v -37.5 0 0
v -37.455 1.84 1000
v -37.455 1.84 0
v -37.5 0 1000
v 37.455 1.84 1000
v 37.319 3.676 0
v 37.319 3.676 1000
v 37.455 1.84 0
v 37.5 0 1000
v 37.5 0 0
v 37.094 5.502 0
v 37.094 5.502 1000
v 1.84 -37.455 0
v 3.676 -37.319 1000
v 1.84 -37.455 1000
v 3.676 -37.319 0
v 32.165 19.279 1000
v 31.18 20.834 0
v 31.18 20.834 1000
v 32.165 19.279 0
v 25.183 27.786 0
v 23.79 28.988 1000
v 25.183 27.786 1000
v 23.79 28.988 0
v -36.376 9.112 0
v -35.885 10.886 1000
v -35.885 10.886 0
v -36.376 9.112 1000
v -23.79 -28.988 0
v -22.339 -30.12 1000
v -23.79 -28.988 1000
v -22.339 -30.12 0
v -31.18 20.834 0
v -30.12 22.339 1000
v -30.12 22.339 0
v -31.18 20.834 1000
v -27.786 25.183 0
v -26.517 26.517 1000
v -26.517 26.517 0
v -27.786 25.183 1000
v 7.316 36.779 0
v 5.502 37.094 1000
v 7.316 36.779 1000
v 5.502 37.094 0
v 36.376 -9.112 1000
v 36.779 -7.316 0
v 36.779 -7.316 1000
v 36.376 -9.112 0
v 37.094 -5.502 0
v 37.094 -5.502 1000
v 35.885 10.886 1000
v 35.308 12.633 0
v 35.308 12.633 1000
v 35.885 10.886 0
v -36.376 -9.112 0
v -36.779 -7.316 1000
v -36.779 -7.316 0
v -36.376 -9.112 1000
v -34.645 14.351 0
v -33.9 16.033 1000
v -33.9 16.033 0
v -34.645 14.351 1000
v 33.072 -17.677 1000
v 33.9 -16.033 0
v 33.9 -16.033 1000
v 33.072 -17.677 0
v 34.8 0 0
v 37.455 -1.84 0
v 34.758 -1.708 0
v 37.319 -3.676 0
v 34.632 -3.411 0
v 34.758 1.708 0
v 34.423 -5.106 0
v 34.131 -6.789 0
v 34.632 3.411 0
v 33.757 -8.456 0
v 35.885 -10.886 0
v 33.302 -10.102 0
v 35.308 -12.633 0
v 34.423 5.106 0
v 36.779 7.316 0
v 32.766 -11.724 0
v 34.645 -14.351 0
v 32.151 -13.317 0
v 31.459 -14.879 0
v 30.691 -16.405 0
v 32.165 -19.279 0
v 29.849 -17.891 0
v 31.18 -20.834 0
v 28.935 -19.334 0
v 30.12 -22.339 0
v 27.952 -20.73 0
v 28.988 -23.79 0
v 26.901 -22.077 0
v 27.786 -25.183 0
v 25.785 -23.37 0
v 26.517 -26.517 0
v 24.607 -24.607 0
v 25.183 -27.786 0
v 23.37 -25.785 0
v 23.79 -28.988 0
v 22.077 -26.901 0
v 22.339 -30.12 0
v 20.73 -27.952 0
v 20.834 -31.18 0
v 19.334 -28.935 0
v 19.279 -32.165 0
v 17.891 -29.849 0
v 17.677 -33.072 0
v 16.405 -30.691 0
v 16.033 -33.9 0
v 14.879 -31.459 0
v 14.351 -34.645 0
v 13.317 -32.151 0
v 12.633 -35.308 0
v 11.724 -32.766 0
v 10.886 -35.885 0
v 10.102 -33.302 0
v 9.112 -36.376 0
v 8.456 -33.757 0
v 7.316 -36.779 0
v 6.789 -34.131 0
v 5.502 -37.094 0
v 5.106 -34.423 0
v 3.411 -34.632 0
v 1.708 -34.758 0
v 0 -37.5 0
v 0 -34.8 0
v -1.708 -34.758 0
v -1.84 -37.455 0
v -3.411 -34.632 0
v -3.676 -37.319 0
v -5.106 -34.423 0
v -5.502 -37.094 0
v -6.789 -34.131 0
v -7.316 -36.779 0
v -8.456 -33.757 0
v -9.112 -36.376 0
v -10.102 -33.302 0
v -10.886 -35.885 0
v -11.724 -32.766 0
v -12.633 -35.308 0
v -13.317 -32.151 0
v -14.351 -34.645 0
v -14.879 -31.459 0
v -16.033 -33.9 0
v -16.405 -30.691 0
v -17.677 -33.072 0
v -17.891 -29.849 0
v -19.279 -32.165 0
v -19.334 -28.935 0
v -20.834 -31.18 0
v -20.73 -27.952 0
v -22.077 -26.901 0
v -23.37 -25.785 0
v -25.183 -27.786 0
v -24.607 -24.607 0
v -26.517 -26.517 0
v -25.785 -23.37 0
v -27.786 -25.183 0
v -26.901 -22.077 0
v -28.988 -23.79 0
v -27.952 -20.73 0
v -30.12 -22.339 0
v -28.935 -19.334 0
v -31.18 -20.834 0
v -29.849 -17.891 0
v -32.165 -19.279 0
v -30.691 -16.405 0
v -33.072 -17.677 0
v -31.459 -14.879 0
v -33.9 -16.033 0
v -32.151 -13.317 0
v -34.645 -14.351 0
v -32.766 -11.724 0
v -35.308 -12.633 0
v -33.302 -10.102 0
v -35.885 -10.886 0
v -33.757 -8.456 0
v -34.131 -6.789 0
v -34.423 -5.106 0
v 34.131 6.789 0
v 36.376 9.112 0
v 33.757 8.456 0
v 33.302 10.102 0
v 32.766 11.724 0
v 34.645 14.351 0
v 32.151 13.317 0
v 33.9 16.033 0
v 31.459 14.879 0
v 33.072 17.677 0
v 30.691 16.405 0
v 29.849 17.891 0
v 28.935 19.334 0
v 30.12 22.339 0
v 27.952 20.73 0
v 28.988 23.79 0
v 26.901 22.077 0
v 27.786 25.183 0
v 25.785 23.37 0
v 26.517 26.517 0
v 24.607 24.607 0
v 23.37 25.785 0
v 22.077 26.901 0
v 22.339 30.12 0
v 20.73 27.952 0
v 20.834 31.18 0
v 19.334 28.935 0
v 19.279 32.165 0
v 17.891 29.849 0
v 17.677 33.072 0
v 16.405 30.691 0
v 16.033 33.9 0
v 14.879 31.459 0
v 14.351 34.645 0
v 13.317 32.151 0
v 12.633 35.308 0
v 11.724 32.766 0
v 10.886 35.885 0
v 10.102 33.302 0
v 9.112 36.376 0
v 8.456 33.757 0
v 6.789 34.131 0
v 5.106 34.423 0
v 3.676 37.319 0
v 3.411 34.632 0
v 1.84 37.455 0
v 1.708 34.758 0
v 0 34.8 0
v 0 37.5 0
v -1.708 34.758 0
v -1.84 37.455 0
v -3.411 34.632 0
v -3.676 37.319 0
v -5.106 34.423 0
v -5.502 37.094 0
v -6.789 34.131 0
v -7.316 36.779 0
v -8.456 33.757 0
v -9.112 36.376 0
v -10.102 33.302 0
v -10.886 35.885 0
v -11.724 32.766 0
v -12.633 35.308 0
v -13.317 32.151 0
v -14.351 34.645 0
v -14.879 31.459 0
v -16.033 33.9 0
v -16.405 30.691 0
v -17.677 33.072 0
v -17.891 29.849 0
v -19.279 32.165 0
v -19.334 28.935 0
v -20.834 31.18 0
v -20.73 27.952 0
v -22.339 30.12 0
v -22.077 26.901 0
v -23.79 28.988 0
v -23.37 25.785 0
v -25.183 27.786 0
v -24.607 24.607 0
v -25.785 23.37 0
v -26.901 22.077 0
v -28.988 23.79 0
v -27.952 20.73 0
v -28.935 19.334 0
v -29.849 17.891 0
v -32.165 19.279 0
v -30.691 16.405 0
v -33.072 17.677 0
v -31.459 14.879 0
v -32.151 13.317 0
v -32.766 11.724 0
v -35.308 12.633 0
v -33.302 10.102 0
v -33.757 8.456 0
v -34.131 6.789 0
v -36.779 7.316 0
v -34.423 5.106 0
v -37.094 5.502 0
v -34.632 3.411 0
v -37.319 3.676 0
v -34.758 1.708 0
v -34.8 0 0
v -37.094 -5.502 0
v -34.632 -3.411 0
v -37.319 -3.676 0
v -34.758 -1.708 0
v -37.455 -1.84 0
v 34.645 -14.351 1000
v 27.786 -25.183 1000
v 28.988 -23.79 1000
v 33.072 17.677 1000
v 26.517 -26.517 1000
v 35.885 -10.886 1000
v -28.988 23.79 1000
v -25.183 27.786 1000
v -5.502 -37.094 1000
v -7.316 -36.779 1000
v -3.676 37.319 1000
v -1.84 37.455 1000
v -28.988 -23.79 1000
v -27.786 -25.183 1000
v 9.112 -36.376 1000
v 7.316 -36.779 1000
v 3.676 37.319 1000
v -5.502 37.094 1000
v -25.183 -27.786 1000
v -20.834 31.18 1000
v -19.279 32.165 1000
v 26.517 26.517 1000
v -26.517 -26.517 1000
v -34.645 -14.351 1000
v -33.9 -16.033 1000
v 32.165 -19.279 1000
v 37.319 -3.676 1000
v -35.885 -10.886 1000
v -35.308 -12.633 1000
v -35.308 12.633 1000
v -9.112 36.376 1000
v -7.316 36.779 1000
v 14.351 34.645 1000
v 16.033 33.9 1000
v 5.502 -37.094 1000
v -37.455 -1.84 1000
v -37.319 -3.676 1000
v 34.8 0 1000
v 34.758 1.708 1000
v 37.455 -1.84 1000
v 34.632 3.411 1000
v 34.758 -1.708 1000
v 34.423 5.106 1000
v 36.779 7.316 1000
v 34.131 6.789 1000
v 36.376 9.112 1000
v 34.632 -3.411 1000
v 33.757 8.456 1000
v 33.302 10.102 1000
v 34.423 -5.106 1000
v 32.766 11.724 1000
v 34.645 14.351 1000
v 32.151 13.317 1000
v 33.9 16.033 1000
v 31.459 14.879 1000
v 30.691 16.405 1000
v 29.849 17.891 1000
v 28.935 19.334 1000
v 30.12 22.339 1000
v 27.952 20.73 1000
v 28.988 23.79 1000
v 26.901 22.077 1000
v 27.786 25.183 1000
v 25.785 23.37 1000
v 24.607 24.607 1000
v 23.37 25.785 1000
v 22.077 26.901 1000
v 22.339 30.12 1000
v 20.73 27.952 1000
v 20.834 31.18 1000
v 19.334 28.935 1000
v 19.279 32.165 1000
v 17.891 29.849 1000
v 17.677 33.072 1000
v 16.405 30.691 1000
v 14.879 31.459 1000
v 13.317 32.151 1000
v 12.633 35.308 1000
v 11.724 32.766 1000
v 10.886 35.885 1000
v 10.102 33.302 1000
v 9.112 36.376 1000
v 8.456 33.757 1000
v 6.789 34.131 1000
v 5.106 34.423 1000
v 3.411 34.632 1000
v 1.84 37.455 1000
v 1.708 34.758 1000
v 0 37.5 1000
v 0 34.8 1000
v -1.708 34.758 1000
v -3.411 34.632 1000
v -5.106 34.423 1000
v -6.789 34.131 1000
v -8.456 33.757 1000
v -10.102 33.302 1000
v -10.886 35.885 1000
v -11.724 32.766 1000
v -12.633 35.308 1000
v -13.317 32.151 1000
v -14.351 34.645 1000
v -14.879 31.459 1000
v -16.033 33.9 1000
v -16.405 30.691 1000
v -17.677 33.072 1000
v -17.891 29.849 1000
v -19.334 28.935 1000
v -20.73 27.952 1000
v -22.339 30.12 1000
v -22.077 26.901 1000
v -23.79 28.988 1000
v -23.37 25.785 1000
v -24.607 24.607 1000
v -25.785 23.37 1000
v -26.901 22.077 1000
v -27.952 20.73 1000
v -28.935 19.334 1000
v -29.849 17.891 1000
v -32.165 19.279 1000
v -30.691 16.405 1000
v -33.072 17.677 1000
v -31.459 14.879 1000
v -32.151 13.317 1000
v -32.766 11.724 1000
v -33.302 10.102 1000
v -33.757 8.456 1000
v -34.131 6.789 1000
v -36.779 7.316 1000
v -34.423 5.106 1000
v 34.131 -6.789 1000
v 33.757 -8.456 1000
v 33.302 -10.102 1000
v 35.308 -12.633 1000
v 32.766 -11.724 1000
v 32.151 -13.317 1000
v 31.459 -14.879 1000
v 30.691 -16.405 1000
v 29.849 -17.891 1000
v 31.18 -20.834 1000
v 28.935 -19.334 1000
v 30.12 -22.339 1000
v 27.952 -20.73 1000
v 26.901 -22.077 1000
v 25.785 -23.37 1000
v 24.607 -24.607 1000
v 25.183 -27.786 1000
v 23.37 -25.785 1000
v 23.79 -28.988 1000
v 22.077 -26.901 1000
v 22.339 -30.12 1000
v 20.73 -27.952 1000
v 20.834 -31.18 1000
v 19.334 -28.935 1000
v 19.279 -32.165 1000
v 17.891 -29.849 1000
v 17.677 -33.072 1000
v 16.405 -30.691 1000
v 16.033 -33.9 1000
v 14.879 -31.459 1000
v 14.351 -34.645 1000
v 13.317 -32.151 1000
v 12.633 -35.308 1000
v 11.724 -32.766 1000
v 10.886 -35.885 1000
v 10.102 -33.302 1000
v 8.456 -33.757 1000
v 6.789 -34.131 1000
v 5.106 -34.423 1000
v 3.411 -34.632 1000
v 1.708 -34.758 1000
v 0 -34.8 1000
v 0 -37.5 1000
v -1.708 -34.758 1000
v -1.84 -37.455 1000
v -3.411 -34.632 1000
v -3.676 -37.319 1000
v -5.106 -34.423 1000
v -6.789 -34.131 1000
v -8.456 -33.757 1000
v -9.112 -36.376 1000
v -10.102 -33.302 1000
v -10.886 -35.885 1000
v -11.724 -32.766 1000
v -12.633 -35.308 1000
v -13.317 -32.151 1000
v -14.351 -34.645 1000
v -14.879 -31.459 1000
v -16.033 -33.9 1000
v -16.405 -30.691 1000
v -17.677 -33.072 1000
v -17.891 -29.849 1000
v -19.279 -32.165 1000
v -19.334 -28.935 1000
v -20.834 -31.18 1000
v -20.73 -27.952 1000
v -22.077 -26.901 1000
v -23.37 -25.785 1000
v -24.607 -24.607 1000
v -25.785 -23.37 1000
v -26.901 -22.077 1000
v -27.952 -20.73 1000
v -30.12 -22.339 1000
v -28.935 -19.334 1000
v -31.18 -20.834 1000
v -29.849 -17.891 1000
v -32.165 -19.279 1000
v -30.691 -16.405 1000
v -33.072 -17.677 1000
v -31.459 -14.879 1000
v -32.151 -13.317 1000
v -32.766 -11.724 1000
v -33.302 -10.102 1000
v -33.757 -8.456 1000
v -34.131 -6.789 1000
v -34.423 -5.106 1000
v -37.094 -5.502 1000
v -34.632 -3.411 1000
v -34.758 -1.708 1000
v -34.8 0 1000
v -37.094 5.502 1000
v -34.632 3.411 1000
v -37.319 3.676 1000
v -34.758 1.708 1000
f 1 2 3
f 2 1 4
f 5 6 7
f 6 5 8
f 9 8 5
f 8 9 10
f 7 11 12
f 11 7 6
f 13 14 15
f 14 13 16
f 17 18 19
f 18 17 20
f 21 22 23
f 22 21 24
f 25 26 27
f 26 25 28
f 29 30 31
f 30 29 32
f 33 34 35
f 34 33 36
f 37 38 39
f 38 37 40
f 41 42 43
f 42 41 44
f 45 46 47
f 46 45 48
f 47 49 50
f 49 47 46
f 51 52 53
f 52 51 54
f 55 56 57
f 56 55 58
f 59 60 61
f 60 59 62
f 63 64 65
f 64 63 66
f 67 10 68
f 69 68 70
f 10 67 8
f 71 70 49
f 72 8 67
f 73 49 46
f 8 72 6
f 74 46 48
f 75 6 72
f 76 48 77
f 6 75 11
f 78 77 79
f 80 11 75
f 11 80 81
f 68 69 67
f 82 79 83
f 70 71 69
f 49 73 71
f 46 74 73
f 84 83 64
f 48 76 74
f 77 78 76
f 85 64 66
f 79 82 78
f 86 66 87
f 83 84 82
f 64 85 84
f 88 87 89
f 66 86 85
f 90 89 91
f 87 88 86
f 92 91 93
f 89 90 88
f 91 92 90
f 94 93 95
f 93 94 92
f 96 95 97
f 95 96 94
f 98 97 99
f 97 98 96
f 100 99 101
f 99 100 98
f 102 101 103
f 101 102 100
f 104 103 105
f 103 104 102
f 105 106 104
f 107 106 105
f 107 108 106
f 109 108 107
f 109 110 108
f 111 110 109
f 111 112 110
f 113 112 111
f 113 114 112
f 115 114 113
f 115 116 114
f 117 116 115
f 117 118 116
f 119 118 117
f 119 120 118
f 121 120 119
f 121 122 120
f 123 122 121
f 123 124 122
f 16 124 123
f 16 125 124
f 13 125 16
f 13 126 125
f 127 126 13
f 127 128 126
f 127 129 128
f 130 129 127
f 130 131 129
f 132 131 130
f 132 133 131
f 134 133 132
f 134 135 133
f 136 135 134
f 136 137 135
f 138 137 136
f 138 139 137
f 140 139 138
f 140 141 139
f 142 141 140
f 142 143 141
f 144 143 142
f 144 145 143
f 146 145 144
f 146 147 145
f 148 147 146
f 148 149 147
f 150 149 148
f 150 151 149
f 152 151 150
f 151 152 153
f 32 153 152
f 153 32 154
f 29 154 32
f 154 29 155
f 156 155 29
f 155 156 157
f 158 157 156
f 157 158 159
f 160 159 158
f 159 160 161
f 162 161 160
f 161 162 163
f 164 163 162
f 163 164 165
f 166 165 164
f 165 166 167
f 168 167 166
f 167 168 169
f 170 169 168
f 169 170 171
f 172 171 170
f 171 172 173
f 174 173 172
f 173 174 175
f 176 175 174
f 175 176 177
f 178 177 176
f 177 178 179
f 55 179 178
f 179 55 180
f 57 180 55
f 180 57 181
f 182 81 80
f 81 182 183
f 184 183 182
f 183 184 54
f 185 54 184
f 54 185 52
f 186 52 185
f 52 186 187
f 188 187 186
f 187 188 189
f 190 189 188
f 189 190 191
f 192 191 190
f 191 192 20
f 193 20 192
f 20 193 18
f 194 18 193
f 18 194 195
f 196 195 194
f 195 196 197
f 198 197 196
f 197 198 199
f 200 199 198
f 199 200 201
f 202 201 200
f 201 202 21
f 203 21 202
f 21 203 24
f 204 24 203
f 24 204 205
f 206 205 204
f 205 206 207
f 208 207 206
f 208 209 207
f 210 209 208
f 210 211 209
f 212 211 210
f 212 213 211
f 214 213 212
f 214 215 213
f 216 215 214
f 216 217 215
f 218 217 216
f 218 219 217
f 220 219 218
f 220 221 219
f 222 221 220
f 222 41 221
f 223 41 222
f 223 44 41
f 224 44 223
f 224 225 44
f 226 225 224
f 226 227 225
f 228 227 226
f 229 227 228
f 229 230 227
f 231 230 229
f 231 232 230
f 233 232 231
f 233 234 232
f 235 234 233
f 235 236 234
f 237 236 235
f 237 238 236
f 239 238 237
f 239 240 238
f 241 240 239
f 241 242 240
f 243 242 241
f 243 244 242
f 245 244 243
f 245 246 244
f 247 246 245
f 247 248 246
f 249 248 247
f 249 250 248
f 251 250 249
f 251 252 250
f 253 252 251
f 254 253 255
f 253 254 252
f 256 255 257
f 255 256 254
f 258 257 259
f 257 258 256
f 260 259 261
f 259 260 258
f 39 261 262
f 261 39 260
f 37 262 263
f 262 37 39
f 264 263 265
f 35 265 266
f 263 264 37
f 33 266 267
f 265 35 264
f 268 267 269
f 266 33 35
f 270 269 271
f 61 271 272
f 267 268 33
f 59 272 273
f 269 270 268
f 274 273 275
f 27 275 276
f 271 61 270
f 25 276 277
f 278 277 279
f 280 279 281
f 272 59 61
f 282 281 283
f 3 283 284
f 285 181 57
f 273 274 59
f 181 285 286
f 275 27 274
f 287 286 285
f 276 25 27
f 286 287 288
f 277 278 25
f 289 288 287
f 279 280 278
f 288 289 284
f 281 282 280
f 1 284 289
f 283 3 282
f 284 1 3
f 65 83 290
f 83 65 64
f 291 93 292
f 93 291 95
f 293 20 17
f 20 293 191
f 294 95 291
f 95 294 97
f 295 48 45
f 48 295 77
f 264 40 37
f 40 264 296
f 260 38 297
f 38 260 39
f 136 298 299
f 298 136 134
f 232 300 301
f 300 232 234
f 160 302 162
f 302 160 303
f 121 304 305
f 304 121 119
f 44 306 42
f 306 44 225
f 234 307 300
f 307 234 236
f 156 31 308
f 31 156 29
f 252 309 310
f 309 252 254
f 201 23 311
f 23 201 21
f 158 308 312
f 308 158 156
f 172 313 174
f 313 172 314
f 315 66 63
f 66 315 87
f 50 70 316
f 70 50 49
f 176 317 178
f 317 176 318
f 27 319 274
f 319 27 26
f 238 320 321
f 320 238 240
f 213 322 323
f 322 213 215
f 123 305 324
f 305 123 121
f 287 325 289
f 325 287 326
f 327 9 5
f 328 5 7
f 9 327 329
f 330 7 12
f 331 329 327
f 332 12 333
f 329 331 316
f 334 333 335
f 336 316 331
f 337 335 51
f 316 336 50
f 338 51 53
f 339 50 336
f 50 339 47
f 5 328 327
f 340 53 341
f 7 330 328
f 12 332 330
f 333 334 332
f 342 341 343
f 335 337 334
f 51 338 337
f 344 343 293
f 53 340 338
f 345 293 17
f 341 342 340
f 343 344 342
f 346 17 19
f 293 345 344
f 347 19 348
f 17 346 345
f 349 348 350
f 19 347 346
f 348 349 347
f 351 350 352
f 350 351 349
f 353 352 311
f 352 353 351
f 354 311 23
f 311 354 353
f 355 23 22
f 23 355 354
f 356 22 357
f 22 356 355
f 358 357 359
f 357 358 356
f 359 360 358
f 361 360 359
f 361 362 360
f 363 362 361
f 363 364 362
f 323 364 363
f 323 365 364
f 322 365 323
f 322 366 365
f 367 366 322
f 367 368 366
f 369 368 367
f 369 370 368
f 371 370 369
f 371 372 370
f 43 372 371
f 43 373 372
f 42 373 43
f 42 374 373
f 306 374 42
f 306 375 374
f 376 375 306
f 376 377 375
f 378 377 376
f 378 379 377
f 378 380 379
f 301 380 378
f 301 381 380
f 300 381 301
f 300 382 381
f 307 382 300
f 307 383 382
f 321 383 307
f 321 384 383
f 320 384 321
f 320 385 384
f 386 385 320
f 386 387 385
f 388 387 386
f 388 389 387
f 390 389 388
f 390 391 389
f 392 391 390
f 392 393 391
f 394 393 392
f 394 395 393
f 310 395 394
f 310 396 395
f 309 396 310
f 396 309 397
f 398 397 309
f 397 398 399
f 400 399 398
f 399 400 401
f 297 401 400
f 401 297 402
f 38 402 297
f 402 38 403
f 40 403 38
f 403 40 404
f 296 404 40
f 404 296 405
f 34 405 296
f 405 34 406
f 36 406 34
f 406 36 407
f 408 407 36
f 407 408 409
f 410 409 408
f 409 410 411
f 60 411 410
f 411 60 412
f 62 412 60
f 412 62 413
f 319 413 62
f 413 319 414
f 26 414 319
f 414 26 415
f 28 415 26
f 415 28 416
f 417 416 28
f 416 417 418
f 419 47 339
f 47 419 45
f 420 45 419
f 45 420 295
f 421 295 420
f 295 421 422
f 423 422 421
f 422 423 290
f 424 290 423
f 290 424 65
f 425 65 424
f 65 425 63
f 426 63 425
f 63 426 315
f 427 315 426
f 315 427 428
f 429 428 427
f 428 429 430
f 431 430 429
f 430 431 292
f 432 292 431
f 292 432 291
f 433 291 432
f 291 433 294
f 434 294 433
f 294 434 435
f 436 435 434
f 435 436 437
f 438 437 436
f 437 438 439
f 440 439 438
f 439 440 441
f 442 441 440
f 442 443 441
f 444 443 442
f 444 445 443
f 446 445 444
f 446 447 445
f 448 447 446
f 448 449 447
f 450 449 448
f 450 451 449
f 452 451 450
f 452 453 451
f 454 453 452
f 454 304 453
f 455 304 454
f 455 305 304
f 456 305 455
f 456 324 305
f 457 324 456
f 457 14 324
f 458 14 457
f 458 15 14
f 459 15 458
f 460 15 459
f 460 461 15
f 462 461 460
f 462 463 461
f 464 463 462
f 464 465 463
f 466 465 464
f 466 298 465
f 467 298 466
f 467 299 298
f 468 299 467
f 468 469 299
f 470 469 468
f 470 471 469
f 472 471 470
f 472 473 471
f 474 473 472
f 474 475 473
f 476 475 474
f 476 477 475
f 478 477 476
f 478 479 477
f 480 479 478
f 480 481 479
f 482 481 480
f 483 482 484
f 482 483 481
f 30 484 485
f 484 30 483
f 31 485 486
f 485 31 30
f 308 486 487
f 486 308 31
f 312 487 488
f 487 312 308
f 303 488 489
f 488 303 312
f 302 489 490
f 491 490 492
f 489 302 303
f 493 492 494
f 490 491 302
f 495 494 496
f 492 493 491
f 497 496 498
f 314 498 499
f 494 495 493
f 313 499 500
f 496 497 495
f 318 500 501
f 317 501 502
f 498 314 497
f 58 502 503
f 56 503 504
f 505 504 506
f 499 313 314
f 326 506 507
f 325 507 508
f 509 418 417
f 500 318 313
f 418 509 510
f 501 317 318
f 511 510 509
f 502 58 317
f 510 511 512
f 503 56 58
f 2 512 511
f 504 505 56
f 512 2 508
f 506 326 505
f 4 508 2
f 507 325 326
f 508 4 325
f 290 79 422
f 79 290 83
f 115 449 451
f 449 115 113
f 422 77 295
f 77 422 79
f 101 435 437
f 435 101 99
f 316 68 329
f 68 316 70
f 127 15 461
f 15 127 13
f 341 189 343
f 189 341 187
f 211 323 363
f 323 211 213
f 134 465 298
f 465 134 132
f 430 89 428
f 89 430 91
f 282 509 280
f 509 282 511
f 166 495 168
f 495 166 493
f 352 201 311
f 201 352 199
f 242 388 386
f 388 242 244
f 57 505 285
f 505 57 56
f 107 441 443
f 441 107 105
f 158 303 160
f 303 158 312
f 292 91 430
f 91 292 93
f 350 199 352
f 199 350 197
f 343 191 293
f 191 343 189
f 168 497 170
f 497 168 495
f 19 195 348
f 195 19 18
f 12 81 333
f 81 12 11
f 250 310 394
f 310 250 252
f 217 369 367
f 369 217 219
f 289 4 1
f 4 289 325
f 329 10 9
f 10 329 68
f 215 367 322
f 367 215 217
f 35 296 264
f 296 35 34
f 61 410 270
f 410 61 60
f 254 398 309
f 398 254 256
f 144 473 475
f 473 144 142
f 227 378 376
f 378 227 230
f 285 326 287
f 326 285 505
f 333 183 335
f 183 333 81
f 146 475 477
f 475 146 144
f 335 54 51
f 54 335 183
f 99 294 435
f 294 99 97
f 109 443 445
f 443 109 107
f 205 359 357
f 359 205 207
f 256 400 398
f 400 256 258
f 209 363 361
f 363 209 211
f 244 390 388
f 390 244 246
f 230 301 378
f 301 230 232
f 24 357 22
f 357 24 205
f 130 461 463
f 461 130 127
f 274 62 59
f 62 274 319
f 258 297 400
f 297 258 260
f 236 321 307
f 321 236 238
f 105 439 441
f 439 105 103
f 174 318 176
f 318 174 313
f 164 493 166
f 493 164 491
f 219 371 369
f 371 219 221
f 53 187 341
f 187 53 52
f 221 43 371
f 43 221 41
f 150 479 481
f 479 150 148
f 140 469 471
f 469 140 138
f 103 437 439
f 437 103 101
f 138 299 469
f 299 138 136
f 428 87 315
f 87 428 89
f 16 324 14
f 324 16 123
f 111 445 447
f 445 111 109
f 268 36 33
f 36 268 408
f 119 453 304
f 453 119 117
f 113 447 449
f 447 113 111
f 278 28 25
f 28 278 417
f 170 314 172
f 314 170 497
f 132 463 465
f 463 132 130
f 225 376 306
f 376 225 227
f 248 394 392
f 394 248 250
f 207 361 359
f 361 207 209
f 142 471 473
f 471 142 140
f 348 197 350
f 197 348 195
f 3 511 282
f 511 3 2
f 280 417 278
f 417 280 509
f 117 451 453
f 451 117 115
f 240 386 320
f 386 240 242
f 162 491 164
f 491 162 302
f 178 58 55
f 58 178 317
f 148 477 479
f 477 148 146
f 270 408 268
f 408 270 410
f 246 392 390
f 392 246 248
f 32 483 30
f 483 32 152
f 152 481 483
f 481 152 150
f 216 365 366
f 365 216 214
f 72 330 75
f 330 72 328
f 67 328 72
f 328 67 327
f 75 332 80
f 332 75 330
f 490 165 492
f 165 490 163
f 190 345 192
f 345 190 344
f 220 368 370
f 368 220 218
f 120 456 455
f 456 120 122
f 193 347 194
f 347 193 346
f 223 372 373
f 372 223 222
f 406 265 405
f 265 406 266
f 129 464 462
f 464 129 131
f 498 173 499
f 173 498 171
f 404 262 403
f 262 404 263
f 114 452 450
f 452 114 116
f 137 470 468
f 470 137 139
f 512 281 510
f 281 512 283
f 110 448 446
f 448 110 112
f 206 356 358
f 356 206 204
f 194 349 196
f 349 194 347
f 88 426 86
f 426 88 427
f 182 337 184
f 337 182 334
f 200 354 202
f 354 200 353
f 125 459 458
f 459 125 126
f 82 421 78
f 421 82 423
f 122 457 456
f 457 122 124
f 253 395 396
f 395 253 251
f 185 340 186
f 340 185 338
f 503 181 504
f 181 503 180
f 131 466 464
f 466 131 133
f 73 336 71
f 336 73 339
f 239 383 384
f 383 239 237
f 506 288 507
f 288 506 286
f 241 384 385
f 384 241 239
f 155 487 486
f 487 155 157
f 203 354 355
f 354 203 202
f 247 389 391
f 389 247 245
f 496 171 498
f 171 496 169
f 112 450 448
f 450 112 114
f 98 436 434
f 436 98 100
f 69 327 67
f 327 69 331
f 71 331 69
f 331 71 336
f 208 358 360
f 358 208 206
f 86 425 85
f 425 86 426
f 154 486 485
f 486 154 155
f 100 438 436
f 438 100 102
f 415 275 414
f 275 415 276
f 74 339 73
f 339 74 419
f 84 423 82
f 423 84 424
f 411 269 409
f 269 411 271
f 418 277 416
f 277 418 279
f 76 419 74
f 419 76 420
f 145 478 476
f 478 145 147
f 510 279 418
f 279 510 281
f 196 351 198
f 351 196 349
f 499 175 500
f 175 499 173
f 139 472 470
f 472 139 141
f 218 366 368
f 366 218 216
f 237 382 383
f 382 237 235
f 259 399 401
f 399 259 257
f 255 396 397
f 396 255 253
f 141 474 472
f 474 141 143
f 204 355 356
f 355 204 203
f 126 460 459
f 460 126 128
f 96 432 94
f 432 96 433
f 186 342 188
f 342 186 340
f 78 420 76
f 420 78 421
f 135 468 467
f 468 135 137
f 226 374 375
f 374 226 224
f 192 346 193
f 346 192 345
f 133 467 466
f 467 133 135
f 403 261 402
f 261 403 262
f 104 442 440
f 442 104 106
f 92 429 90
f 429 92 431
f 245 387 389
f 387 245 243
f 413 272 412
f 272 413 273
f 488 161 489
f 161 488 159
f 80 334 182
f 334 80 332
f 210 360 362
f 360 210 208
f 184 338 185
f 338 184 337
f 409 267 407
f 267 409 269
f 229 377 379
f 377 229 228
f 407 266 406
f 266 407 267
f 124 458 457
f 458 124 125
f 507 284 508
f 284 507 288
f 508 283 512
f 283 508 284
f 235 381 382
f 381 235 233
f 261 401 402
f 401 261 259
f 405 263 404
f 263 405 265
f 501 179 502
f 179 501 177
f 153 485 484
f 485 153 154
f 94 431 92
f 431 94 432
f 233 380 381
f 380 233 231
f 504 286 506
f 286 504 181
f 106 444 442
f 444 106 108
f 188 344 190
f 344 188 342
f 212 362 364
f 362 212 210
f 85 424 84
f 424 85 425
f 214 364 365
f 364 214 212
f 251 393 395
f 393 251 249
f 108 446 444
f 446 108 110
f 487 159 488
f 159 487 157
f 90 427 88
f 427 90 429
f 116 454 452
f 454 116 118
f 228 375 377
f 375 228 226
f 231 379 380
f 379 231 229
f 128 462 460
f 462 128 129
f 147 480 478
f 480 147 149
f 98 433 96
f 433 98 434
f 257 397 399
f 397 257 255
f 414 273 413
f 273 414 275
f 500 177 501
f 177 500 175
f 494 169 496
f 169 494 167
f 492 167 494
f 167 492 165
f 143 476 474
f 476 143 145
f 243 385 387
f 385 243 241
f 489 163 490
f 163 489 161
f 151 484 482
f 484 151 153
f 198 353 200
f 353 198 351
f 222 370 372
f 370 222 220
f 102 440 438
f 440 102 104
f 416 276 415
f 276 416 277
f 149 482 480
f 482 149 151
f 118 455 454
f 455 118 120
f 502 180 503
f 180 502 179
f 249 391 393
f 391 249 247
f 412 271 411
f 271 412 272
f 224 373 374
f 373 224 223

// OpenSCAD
$fn = 128;

// HT 75 pipe, length 1000 mm (typical OD 75 mm, wall ~2.7 mm)
pipe_length = 1000;
outer_d = 75;
wall = 2.7;
inner_d = outer_d - 2*wall;

module ht_pipe(od, id, L) {
    difference() {
        cylinder(h = L, d = od, center = false);
        translate([0,0,-0.1])
            cylinder(h = L + 0.2, d = id, center = false);
    }
}

ht_pipe(outer_d, inner_d, pipe_length);
